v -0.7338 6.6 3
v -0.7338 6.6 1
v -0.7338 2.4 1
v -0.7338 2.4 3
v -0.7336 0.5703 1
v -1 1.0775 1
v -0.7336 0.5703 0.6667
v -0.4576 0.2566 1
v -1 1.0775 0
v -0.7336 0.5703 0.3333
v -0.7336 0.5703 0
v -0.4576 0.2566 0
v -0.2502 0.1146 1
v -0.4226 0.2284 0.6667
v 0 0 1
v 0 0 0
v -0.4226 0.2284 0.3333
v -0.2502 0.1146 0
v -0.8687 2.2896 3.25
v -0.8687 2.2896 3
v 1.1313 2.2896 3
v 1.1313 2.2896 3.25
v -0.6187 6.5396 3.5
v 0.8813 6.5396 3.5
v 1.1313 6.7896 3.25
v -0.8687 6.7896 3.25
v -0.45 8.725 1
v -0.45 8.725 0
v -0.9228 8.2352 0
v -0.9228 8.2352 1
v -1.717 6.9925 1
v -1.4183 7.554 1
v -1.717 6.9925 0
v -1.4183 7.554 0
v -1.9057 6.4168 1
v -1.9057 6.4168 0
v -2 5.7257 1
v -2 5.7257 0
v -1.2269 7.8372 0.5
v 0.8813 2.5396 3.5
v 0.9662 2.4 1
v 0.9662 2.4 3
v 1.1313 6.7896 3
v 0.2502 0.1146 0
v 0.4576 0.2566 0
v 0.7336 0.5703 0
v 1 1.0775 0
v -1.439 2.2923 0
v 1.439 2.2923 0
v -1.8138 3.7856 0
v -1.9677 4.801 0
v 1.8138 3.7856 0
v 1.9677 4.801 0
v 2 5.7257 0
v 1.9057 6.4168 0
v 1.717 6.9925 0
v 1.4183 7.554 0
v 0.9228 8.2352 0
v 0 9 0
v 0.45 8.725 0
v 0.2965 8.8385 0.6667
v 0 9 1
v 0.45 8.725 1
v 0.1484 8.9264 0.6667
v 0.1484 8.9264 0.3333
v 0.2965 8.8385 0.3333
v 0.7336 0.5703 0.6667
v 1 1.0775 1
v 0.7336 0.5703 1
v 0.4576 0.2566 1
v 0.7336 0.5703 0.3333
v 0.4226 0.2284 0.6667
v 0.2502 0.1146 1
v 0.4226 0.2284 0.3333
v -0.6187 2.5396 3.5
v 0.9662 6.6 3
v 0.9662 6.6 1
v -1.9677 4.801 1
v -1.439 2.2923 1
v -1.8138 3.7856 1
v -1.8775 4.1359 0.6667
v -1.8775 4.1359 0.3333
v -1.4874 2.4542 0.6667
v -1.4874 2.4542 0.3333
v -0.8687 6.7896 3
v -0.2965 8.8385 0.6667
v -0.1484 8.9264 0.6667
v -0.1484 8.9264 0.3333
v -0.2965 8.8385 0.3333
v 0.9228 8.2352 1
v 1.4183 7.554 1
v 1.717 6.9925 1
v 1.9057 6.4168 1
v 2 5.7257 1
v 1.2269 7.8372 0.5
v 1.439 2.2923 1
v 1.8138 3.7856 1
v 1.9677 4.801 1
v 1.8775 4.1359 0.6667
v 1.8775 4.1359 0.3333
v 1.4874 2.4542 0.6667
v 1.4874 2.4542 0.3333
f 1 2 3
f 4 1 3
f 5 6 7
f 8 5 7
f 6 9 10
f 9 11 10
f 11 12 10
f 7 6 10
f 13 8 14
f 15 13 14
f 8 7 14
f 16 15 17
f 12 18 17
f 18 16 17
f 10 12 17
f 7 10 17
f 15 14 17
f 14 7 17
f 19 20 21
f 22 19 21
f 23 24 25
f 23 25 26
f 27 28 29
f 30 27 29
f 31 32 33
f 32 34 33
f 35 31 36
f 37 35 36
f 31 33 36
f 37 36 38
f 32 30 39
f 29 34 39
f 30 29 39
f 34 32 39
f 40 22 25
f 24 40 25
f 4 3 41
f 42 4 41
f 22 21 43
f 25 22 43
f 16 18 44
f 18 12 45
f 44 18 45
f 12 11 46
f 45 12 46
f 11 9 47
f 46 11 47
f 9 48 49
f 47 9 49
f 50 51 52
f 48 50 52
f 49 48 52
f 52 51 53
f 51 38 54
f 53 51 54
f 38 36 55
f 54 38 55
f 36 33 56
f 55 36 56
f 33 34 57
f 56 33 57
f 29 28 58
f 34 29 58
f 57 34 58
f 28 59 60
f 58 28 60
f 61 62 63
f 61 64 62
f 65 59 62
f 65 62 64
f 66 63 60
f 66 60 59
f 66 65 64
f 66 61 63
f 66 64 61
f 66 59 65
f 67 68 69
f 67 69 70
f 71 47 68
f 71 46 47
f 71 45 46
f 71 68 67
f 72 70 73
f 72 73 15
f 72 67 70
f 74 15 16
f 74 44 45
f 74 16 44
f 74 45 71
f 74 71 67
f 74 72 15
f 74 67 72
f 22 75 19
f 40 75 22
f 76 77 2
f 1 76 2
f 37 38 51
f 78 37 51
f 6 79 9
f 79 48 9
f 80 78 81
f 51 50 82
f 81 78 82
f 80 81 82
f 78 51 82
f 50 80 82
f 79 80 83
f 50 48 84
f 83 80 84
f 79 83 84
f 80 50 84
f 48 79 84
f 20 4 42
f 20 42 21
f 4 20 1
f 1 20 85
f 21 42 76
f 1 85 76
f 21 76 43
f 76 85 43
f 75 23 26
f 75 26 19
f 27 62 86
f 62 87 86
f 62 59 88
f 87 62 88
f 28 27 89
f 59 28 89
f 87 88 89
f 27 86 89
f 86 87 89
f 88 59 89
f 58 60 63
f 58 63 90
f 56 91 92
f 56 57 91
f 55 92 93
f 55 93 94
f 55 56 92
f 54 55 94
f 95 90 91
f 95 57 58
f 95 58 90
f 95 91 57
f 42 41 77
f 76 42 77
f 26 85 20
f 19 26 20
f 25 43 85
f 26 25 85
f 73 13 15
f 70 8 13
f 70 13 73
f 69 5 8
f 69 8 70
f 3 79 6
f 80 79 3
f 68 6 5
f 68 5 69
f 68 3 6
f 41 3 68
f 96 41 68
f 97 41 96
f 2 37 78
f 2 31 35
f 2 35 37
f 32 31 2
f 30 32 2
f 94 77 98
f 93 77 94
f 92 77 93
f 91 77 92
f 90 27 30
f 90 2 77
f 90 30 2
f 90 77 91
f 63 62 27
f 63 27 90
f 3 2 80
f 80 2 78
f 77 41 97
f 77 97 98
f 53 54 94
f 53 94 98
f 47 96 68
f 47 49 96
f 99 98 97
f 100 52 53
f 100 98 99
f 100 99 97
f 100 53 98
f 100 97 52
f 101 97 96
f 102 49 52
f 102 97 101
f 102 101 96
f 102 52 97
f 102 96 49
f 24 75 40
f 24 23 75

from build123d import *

# Parameters (mm, degrees)
F1_DEPTH = 1
F2_W     = 0.9661824606
F2_H     = 2.1
F3_DEPTH = 2
F4_W     = 0.85
F4_H     = 4.2
F5_DEPTH = 0.5
F6_SIZE  = 0.25


with BuildPart() as f1:
    # F0 (on Top) → F1 (new body)
    with BuildSketch(Plane.XY):
        with BuildLine():
            Line((0, 5.7256516985), (-2, 5.7256516985))
            add(Edge.make_bspline(
                [(-2, 5.7256516985), (-2.0680379738, 4.3142188256), (-1.4793331486, 2.1693367722), (-1, 1.0774956806)],
                knots=[0.49395691, 0.49395691, 0.49395691, 0.49395691, 0.8191677941, 0.8191677941, 0.8191677941, 0.8191677941], degree=3))
            Line((-1, 1.0774956806), (0, 1.0774956806))
            Line((0, 1.0774956806), (0, 5.7256516985))
        make_face()
        with BuildLine():
            Line((0, 8.7250128189), (-0.45, 8.7250128189))
            add(Edge.make_bspline(
                [(-0.45, 8.7250128189), (-0.6863850918, 8.530402377), (-1.3369422342, 7.7719026331), (-1.9532092441, 6.6963156863), (-2, 5.7256516985)],
                knots=[0.1083102347, 0.1083102347, 0.1083102347, 0.1083102347, 0.2703044079, 0.49395691, 0.49395691, 0.49395691, 0.49395691], degree=3))
            Line((-2, 5.7256516985), (0, 5.7256516985))
            Line((0, 5.7256516985), (0, 8.7250128189))
        make_face()
        with BuildLine():
            Line((0.45, 8.7250128189), (0, 8.7250128189))
            Line((0, 8.7250128189), (0, 5.7256516985))
            Line((0, 5.7256516985), (2, 5.7256516985))
            add(Edge.make_bspline(
                [(0.45, 8.7250128189), (0.6863850918, 8.530402377), (1.3369422342, 7.7719026331), (1.9532092441, 6.6963156863), (2, 5.7256516985)],
                knots=[0.1083102347, 0.1083102347, 0.1083102347, 0.1083102347, 0.2703044079, 0.49395691, 0.49395691, 0.49395691, 0.49395691], degree=3))
        make_face()
        with BuildLine():
            Line((2, 5.7256516985), (0, 5.7256516985))
            Line((0, 5.7256516985), (0, 1.0774956806))
            Line((0, 1.0774956806), (1, 1.0774956806))
            add(Edge.make_bspline(
                [(2, 5.7256516985), (2.0680379738, 4.3142188256), (1.4793331486, 2.1693367722), (1, 1.0774956806)],
                knots=[0.49395691, 0.49395691, 0.49395691, 0.49395691, 0.8191677941, 0.8191677941, 0.8191677941, 0.8191677941], degree=3))
        make_face()
        with BuildLine():
            Line((1, 1.0774956806), (0, 1.0774956806))
            Line((0, 1.0774956806), (0, 0))
            add(Edge.make_bspline(
                [(1, 1.0774956806), (0.7334687279, 0.4703818268), (0.5007537712, 0.188854692), (0, 0)],
                knots=[0.8191677941, 0.8191677941, 0.8191677941, 0.8191677941, 1, 1, 1, 1], degree=3))
        make_face()
        with BuildLine():
            Line((0, 1.0774956806), (-1, 1.0774956806))
            add(Edge.make_bspline(
                [(-1, 1.0774956806), (-0.7334687279, 0.4703818268), (-0.5007537712, 0.188854692), (0, 0)],
                knots=[0.8191677941, 0.8191677941, 0.8191677941, 0.8191677941, 1, 1, 1, 1], degree=3))
            Line((0, 0), (0, 1.0774956806))
        make_face()
        with BuildLine():
            add(Edge.make_bspline(
                [(0, 9), (0.150392861, 8.929814249), (0.2919515698, 8.8551304782), (0.45, 8.7250128189)],
                knots=[0, 0, 0, 0, 0.1083102347, 0.1083102347, 0.1083102347, 0.1083102347], degree=3))
            Line((0, 9), (0, 8.7250128189))
            Line((0, 8.7250128189), (0.45, 8.7250128189))
        make_face()
        with BuildLine():
            Line((0, 8.7250128189), (0, 9))
            add(Edge.make_bspline(
                [(0, 9), (-0.150392861, 8.929814249), (-0.2919515698, 8.8551304782), (-0.45, 8.7250128189)],
                knots=[0, 0, 0, 0, 0.1083102347, 0.1083102347, 0.1083102347, 0.1083102347], degree=3))
            Line((-0.45, 8.7250128189), (0, 8.7250128189))
        make_face()
    extrude(amount=F1_DEPTH)

    # F2 (on face) → F3 (join)
    with BuildSketch(Plane.XY.offset(1)):
        Polygon((-0.7338175394, 2.4), (0, 2.4), (0, 4.5), (0.9661824606, 4.5), (0.9661824606, 6.6), (-0.7338175394, 6.6), align=None)
        with Locations((0.4830912303, 3.45)):
            Rectangle(F2_W, F2_H)
    extrude(amount=F3_DEPTH)

    # F4 (on face) → F5 (join)
    with BuildSketch(Plane.XY.offset(3)):
        Polygon((0.1161824606, 6.6), (0.1161824606, 6.78964095), (-0.8687144145, 6.78964095), (-0.8687144145, 2.28964095), (0.1161824606, 2.28964095), (0.1161824606, 2.4), (-0.7338175394, 2.4), (-0.7338175394, 6.6), align=None)
        with Locations((-0.3088175394, 4.5)):
            Rectangle(F4_W, F4_H)
        with Locations((0.5411824606, 4.5)):
            Rectangle(F4_W, F4_H)
        Polygon((1.1312855855, 6.78964095), (0.1161824606, 6.78964095), (0.1161824606, 6.6), (0.9661824606, 6.6), (0.9661824606, 2.4), (0.1161824606, 2.4), (0.1161824606, 2.28964095), (1.1312855855, 2.28964095), align=None)
    extrude(amount=F5_DEPTH)

    # F6
    f6_edges = [f1.edges().sort_by_distance(p)[0] for p in [
        (0.131286, 2.289641, 3.5),
        (1.131286, 4.539641, 3.5),
        (0.131286, 6.789641, 3.5),
        (-0.868714, 4.539641, 3.5),
    ]]
    chamfer(f6_edges, length=F6_SIZE)


solid = f1.part
